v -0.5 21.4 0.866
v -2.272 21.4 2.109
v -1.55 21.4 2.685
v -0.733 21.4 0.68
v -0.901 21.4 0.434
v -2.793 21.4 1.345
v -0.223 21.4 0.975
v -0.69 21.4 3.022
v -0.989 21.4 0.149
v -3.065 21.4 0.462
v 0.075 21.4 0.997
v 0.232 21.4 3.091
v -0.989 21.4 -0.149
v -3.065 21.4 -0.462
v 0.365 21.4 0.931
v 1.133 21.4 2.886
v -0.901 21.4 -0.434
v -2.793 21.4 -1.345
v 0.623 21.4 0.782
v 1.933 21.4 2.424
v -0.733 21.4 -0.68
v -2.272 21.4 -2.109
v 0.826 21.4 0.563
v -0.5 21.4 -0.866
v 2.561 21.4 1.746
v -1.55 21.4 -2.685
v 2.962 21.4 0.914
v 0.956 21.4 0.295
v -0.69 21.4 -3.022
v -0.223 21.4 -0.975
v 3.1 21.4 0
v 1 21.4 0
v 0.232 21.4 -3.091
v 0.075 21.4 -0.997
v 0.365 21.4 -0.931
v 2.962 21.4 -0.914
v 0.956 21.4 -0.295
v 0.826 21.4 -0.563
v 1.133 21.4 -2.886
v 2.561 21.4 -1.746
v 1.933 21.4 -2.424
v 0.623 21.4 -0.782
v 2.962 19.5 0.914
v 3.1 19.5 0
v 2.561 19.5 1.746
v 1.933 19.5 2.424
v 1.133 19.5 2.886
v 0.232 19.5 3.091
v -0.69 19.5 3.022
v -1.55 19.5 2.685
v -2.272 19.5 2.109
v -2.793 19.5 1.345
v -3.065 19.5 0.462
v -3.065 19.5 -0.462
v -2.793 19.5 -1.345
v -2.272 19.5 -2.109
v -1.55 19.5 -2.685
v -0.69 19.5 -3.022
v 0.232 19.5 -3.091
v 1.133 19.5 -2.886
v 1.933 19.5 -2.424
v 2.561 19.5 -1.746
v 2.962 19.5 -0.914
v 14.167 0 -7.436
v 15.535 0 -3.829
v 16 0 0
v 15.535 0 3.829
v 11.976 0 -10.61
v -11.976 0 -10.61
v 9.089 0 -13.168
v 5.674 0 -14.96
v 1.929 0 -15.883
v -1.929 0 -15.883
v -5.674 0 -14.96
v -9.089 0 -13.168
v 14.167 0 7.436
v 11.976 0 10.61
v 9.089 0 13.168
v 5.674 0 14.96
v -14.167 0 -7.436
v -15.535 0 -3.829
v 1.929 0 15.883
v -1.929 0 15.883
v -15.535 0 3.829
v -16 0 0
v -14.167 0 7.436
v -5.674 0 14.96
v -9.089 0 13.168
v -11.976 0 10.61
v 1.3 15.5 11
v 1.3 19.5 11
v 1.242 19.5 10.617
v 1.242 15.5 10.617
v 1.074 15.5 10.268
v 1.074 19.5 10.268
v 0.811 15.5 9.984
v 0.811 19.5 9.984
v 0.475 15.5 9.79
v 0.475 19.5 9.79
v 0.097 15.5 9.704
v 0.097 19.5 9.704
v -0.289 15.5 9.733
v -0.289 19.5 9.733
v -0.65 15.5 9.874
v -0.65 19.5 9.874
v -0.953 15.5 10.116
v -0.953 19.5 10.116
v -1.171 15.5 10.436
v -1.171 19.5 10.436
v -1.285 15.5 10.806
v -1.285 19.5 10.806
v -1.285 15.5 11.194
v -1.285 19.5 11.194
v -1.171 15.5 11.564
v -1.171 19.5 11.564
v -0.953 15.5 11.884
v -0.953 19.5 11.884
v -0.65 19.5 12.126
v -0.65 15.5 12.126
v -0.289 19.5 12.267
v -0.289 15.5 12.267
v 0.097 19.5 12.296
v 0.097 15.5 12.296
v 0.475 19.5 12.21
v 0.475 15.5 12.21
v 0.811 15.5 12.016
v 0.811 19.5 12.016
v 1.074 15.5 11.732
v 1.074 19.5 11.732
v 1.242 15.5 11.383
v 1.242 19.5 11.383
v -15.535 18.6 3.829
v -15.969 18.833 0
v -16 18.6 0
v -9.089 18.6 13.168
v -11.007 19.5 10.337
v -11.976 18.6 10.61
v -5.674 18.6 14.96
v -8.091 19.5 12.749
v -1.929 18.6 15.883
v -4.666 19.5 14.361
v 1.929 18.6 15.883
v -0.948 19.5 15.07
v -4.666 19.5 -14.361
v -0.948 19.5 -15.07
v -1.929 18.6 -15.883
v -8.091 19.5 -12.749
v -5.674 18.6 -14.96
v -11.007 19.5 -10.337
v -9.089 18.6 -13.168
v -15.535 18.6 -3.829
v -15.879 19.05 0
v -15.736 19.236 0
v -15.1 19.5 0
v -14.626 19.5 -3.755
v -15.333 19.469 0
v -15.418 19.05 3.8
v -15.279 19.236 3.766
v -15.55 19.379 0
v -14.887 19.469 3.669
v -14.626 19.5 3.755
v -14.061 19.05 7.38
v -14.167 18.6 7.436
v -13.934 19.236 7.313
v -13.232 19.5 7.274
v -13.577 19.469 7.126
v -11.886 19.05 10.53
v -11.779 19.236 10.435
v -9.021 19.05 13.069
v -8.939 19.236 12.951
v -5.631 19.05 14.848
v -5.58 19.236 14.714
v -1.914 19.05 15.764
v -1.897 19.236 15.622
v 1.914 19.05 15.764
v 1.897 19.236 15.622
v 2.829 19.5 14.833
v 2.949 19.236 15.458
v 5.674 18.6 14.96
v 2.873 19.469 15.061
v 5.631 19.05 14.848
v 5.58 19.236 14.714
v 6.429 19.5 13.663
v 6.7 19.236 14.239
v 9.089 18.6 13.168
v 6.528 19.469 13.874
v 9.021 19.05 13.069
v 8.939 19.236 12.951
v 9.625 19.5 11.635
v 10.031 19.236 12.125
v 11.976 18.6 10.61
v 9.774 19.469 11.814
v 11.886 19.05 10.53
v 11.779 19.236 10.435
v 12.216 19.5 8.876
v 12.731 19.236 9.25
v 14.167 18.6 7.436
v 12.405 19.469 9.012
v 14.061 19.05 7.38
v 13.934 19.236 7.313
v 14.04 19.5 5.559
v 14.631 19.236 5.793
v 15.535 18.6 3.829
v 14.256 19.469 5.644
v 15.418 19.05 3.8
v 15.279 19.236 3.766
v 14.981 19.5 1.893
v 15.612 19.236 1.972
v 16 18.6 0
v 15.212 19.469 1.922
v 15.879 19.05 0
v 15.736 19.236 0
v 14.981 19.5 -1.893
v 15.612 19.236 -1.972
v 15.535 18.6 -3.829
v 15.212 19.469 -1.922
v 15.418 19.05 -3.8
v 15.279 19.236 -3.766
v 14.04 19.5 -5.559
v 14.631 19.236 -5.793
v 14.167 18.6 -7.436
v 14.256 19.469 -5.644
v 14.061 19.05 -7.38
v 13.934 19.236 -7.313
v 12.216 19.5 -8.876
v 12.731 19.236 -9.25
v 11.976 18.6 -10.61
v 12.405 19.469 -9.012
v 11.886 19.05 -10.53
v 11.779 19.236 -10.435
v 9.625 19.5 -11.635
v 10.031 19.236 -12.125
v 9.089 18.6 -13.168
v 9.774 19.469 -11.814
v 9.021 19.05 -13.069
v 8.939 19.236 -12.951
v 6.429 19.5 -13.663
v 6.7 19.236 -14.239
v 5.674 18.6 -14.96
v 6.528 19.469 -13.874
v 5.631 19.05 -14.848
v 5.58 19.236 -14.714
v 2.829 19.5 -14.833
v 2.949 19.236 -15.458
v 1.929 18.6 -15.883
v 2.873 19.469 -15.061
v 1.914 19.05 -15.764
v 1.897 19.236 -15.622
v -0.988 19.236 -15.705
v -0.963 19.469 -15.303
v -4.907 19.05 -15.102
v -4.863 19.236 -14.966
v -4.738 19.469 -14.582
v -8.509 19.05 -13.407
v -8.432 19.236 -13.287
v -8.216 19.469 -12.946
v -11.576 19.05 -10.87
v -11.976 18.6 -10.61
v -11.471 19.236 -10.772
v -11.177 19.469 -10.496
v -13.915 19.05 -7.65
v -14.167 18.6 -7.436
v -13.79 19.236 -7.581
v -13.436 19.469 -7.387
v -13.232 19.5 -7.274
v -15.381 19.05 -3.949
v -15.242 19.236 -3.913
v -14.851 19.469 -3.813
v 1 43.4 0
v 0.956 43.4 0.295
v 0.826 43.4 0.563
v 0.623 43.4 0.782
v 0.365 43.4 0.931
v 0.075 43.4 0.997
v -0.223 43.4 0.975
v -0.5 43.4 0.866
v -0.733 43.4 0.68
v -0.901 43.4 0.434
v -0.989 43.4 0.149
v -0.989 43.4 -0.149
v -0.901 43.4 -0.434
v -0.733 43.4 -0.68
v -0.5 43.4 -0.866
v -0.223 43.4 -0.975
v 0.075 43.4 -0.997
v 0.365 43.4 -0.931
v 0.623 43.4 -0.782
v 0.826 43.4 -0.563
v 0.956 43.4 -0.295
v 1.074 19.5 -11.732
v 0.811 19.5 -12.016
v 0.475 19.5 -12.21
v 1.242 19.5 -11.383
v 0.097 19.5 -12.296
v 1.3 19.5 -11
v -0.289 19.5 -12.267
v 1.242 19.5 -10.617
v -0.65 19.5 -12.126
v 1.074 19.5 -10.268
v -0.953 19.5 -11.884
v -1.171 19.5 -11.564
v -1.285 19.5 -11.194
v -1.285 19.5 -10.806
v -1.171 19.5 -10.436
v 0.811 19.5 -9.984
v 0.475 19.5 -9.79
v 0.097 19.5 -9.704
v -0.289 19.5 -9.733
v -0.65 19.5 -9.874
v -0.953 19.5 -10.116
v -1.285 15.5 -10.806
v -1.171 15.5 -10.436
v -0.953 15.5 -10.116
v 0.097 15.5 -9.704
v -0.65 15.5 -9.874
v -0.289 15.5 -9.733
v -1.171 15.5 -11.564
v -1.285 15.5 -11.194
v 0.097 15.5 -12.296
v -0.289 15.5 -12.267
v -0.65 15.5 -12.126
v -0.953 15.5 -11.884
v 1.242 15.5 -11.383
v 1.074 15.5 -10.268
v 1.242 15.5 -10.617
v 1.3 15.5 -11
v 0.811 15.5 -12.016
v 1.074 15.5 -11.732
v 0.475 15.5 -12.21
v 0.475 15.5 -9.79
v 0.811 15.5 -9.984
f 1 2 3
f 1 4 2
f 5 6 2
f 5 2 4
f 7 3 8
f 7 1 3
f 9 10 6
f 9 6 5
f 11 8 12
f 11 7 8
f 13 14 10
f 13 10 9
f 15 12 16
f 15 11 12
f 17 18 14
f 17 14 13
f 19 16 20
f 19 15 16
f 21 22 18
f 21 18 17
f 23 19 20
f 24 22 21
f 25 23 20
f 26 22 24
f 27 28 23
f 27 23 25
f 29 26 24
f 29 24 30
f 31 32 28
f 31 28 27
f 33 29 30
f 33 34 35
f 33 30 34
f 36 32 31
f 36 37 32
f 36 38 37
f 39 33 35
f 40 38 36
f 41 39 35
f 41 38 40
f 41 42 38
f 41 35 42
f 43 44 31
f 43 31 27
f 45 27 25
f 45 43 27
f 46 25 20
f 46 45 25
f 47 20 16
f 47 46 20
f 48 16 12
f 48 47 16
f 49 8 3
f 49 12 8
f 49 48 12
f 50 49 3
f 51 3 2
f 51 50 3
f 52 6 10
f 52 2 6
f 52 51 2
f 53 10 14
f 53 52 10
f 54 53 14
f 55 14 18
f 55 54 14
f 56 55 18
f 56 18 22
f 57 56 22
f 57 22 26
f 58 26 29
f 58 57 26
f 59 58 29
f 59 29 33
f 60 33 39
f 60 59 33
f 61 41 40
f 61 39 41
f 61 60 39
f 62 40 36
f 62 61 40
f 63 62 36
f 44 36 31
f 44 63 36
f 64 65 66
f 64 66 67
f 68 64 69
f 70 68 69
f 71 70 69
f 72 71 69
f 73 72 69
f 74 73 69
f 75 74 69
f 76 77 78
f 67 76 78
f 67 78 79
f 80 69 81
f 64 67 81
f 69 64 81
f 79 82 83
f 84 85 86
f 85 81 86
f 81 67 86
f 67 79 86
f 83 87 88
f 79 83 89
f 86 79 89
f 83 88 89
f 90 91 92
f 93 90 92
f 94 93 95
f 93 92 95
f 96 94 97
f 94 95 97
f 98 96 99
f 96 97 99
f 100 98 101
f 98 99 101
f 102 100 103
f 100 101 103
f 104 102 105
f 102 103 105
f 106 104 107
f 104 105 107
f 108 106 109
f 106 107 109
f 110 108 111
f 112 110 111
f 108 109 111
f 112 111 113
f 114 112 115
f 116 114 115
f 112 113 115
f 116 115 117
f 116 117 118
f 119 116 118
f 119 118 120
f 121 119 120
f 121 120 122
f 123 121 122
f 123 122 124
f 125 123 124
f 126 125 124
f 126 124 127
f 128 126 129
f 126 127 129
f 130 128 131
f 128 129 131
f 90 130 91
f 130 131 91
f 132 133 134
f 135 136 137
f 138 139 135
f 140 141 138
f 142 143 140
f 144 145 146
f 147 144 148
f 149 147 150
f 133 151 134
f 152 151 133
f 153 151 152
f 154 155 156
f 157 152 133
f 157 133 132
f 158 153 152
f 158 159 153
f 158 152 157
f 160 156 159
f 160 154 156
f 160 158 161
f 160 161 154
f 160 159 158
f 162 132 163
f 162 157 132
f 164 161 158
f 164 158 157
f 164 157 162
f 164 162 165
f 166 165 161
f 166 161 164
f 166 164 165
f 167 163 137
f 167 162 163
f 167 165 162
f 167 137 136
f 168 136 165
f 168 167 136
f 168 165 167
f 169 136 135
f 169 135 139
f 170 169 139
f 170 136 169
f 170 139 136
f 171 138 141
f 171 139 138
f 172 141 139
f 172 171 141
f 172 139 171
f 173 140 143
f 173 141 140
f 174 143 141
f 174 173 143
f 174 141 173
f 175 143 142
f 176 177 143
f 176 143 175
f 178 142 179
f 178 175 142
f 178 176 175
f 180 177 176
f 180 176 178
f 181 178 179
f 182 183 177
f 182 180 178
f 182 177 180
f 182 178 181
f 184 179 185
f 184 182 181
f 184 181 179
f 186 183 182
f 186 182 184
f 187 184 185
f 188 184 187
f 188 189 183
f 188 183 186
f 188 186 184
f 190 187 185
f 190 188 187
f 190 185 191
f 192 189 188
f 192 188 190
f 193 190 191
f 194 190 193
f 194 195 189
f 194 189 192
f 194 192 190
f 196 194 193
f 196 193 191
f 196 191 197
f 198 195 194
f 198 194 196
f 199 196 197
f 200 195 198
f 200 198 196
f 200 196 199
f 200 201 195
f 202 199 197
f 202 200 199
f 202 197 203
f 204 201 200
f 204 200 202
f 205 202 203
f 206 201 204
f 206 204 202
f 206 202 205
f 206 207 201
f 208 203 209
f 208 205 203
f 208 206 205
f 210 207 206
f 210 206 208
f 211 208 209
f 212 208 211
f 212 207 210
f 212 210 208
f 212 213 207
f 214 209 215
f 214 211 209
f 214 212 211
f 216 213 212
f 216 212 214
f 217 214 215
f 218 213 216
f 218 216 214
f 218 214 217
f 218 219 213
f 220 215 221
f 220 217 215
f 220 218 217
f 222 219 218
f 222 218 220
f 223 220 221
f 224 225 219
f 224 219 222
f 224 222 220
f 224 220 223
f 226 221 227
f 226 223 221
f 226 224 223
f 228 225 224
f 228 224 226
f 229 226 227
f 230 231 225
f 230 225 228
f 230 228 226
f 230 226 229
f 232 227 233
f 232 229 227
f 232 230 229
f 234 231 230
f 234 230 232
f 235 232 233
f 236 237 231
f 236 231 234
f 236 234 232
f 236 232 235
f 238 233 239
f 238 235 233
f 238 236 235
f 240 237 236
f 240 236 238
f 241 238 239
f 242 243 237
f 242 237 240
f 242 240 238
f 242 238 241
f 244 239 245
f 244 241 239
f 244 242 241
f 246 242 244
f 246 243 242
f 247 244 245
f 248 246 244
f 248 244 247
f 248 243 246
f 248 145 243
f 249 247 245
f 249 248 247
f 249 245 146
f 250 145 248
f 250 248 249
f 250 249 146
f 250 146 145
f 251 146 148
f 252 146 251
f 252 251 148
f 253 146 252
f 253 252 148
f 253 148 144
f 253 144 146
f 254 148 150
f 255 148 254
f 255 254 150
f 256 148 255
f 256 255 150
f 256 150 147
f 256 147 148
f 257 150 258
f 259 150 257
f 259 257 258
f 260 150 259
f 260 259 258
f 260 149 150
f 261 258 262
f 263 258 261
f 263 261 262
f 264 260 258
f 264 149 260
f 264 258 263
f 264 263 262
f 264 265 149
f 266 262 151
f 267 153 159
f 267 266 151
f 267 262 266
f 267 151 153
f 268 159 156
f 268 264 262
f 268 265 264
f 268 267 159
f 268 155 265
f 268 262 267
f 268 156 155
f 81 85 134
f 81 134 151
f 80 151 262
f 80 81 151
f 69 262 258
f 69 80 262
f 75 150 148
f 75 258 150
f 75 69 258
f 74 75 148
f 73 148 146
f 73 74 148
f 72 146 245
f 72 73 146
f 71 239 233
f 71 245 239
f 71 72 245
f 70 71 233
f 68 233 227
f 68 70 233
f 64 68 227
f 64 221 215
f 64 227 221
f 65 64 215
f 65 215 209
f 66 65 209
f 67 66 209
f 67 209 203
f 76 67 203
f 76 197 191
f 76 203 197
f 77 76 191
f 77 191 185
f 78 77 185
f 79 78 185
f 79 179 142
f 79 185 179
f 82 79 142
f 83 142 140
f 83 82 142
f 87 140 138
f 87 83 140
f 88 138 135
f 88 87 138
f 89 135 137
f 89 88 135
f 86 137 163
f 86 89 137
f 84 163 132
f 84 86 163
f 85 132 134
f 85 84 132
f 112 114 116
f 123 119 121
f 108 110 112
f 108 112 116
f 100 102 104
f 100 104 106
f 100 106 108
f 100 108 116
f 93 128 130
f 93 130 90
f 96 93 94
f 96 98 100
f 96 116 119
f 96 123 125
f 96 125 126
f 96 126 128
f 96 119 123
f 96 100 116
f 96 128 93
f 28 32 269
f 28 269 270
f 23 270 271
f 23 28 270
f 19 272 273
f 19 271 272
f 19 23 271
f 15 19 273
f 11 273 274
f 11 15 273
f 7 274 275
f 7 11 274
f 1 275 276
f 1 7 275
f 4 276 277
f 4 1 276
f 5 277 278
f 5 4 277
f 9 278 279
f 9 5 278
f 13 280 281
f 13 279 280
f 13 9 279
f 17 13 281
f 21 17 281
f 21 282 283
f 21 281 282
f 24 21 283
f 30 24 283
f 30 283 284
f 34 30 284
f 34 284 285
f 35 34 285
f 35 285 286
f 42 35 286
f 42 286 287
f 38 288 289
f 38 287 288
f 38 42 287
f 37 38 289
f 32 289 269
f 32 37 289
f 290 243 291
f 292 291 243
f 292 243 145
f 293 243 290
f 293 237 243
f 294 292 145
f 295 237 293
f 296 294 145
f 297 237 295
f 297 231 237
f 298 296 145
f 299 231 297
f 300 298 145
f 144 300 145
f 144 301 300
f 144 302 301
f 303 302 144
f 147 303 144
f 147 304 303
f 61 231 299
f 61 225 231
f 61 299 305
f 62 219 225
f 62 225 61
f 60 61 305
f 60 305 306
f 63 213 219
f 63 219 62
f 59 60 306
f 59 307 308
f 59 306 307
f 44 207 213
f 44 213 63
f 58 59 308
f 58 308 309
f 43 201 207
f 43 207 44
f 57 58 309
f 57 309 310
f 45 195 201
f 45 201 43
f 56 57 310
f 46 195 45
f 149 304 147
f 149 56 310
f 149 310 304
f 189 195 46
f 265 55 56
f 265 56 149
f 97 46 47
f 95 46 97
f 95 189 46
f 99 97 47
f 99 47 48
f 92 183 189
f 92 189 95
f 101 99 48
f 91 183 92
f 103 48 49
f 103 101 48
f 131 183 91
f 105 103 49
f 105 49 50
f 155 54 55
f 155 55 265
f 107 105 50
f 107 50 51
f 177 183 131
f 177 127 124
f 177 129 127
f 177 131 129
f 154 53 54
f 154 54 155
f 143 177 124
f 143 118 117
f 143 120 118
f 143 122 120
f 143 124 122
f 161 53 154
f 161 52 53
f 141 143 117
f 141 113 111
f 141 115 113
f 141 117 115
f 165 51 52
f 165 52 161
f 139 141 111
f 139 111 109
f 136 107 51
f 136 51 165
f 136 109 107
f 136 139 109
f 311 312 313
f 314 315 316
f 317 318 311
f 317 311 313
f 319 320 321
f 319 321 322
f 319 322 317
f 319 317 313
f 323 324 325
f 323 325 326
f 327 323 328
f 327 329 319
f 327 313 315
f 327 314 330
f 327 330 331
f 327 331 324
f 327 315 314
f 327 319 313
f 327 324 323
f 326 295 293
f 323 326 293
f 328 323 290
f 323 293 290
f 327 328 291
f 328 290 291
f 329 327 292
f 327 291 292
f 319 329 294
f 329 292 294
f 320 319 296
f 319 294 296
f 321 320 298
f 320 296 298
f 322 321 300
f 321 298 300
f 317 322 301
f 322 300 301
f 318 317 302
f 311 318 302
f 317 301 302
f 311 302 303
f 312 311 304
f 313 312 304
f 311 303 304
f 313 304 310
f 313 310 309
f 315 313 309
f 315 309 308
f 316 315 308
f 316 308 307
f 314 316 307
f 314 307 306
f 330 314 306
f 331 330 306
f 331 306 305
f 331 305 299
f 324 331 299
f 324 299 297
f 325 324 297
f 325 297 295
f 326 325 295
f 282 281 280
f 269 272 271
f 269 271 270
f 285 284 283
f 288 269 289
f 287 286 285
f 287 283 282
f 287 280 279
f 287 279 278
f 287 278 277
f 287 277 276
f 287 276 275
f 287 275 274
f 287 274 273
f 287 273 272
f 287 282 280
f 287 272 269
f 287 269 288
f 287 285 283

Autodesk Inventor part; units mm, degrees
ref_plane "YZ Plane" through (0, 0, 0) normal (1, 0, 0) x (0, 1, 0)
ref_plane "XZ Plane" through (0, 0, 0) normal (0, 1, 0) x (-1, 0, 0)
ref_plane "XY Plane" through (0, 0, 0) normal (0, 0, 1) x (1, 0, 0)
sketch "Sketch1" plane through (0, 0, 0) normal (0, 1, 0) x (-1, 0, 0)
  circle A0 centre (0, 0) radius 16
  dimension "d0" = 32
extrude "Extrusion1" add sketch "Sketch1" along normal blind 19.5
sketch "Sketch2" plane through (0, 19.5, 0) normal (0, 1, 0) x (1, 0, 0)
  circle A0 centre (0, 0) radius 16 projected
  circle A1 centre (0, 0) radius 3.1
  dimension "d3" = 6.2
extrude "Extrusion2" add sketch "Sketch2" along normal blind 1.9 contours A1
sketch "Sketch3" plane through (0, 21.4, 0) normal (0, 1, 0) x (1, 0, 0)
  circle A0 centre (0, 0) radius 3.1 projected
  circle A1 centre (0, 0) radius 1
  dimension "d6" = 2
extrude "Extrusion3" add sketch "Sketch3" along normal blind 22 contours A1
sketch "Sketch4" plane through (0, 19.5, 0) normal (0, 1, 0) x (1, 0, 0)
  circle A0 centre (0, 0) radius 3.1 projected
  circle A1 centre (0, 0) radius 16 projected
  circle A2 centre (0, -11) radius 1.3
  circle A3 centre (0, 11) radius 1.3
  line L0 (-16, 0) -> (16, 0)
  dimension "d9" = 2.6
  dimension "d10" = 22
extrude "Extrusion4" cut sketch "Sketch4" against normal blind 4 contours A2 | A3
fillet "Fillet1" radius 0.9 1 edges at (16, 19.5, 0)
properties part number "rf500tb"
